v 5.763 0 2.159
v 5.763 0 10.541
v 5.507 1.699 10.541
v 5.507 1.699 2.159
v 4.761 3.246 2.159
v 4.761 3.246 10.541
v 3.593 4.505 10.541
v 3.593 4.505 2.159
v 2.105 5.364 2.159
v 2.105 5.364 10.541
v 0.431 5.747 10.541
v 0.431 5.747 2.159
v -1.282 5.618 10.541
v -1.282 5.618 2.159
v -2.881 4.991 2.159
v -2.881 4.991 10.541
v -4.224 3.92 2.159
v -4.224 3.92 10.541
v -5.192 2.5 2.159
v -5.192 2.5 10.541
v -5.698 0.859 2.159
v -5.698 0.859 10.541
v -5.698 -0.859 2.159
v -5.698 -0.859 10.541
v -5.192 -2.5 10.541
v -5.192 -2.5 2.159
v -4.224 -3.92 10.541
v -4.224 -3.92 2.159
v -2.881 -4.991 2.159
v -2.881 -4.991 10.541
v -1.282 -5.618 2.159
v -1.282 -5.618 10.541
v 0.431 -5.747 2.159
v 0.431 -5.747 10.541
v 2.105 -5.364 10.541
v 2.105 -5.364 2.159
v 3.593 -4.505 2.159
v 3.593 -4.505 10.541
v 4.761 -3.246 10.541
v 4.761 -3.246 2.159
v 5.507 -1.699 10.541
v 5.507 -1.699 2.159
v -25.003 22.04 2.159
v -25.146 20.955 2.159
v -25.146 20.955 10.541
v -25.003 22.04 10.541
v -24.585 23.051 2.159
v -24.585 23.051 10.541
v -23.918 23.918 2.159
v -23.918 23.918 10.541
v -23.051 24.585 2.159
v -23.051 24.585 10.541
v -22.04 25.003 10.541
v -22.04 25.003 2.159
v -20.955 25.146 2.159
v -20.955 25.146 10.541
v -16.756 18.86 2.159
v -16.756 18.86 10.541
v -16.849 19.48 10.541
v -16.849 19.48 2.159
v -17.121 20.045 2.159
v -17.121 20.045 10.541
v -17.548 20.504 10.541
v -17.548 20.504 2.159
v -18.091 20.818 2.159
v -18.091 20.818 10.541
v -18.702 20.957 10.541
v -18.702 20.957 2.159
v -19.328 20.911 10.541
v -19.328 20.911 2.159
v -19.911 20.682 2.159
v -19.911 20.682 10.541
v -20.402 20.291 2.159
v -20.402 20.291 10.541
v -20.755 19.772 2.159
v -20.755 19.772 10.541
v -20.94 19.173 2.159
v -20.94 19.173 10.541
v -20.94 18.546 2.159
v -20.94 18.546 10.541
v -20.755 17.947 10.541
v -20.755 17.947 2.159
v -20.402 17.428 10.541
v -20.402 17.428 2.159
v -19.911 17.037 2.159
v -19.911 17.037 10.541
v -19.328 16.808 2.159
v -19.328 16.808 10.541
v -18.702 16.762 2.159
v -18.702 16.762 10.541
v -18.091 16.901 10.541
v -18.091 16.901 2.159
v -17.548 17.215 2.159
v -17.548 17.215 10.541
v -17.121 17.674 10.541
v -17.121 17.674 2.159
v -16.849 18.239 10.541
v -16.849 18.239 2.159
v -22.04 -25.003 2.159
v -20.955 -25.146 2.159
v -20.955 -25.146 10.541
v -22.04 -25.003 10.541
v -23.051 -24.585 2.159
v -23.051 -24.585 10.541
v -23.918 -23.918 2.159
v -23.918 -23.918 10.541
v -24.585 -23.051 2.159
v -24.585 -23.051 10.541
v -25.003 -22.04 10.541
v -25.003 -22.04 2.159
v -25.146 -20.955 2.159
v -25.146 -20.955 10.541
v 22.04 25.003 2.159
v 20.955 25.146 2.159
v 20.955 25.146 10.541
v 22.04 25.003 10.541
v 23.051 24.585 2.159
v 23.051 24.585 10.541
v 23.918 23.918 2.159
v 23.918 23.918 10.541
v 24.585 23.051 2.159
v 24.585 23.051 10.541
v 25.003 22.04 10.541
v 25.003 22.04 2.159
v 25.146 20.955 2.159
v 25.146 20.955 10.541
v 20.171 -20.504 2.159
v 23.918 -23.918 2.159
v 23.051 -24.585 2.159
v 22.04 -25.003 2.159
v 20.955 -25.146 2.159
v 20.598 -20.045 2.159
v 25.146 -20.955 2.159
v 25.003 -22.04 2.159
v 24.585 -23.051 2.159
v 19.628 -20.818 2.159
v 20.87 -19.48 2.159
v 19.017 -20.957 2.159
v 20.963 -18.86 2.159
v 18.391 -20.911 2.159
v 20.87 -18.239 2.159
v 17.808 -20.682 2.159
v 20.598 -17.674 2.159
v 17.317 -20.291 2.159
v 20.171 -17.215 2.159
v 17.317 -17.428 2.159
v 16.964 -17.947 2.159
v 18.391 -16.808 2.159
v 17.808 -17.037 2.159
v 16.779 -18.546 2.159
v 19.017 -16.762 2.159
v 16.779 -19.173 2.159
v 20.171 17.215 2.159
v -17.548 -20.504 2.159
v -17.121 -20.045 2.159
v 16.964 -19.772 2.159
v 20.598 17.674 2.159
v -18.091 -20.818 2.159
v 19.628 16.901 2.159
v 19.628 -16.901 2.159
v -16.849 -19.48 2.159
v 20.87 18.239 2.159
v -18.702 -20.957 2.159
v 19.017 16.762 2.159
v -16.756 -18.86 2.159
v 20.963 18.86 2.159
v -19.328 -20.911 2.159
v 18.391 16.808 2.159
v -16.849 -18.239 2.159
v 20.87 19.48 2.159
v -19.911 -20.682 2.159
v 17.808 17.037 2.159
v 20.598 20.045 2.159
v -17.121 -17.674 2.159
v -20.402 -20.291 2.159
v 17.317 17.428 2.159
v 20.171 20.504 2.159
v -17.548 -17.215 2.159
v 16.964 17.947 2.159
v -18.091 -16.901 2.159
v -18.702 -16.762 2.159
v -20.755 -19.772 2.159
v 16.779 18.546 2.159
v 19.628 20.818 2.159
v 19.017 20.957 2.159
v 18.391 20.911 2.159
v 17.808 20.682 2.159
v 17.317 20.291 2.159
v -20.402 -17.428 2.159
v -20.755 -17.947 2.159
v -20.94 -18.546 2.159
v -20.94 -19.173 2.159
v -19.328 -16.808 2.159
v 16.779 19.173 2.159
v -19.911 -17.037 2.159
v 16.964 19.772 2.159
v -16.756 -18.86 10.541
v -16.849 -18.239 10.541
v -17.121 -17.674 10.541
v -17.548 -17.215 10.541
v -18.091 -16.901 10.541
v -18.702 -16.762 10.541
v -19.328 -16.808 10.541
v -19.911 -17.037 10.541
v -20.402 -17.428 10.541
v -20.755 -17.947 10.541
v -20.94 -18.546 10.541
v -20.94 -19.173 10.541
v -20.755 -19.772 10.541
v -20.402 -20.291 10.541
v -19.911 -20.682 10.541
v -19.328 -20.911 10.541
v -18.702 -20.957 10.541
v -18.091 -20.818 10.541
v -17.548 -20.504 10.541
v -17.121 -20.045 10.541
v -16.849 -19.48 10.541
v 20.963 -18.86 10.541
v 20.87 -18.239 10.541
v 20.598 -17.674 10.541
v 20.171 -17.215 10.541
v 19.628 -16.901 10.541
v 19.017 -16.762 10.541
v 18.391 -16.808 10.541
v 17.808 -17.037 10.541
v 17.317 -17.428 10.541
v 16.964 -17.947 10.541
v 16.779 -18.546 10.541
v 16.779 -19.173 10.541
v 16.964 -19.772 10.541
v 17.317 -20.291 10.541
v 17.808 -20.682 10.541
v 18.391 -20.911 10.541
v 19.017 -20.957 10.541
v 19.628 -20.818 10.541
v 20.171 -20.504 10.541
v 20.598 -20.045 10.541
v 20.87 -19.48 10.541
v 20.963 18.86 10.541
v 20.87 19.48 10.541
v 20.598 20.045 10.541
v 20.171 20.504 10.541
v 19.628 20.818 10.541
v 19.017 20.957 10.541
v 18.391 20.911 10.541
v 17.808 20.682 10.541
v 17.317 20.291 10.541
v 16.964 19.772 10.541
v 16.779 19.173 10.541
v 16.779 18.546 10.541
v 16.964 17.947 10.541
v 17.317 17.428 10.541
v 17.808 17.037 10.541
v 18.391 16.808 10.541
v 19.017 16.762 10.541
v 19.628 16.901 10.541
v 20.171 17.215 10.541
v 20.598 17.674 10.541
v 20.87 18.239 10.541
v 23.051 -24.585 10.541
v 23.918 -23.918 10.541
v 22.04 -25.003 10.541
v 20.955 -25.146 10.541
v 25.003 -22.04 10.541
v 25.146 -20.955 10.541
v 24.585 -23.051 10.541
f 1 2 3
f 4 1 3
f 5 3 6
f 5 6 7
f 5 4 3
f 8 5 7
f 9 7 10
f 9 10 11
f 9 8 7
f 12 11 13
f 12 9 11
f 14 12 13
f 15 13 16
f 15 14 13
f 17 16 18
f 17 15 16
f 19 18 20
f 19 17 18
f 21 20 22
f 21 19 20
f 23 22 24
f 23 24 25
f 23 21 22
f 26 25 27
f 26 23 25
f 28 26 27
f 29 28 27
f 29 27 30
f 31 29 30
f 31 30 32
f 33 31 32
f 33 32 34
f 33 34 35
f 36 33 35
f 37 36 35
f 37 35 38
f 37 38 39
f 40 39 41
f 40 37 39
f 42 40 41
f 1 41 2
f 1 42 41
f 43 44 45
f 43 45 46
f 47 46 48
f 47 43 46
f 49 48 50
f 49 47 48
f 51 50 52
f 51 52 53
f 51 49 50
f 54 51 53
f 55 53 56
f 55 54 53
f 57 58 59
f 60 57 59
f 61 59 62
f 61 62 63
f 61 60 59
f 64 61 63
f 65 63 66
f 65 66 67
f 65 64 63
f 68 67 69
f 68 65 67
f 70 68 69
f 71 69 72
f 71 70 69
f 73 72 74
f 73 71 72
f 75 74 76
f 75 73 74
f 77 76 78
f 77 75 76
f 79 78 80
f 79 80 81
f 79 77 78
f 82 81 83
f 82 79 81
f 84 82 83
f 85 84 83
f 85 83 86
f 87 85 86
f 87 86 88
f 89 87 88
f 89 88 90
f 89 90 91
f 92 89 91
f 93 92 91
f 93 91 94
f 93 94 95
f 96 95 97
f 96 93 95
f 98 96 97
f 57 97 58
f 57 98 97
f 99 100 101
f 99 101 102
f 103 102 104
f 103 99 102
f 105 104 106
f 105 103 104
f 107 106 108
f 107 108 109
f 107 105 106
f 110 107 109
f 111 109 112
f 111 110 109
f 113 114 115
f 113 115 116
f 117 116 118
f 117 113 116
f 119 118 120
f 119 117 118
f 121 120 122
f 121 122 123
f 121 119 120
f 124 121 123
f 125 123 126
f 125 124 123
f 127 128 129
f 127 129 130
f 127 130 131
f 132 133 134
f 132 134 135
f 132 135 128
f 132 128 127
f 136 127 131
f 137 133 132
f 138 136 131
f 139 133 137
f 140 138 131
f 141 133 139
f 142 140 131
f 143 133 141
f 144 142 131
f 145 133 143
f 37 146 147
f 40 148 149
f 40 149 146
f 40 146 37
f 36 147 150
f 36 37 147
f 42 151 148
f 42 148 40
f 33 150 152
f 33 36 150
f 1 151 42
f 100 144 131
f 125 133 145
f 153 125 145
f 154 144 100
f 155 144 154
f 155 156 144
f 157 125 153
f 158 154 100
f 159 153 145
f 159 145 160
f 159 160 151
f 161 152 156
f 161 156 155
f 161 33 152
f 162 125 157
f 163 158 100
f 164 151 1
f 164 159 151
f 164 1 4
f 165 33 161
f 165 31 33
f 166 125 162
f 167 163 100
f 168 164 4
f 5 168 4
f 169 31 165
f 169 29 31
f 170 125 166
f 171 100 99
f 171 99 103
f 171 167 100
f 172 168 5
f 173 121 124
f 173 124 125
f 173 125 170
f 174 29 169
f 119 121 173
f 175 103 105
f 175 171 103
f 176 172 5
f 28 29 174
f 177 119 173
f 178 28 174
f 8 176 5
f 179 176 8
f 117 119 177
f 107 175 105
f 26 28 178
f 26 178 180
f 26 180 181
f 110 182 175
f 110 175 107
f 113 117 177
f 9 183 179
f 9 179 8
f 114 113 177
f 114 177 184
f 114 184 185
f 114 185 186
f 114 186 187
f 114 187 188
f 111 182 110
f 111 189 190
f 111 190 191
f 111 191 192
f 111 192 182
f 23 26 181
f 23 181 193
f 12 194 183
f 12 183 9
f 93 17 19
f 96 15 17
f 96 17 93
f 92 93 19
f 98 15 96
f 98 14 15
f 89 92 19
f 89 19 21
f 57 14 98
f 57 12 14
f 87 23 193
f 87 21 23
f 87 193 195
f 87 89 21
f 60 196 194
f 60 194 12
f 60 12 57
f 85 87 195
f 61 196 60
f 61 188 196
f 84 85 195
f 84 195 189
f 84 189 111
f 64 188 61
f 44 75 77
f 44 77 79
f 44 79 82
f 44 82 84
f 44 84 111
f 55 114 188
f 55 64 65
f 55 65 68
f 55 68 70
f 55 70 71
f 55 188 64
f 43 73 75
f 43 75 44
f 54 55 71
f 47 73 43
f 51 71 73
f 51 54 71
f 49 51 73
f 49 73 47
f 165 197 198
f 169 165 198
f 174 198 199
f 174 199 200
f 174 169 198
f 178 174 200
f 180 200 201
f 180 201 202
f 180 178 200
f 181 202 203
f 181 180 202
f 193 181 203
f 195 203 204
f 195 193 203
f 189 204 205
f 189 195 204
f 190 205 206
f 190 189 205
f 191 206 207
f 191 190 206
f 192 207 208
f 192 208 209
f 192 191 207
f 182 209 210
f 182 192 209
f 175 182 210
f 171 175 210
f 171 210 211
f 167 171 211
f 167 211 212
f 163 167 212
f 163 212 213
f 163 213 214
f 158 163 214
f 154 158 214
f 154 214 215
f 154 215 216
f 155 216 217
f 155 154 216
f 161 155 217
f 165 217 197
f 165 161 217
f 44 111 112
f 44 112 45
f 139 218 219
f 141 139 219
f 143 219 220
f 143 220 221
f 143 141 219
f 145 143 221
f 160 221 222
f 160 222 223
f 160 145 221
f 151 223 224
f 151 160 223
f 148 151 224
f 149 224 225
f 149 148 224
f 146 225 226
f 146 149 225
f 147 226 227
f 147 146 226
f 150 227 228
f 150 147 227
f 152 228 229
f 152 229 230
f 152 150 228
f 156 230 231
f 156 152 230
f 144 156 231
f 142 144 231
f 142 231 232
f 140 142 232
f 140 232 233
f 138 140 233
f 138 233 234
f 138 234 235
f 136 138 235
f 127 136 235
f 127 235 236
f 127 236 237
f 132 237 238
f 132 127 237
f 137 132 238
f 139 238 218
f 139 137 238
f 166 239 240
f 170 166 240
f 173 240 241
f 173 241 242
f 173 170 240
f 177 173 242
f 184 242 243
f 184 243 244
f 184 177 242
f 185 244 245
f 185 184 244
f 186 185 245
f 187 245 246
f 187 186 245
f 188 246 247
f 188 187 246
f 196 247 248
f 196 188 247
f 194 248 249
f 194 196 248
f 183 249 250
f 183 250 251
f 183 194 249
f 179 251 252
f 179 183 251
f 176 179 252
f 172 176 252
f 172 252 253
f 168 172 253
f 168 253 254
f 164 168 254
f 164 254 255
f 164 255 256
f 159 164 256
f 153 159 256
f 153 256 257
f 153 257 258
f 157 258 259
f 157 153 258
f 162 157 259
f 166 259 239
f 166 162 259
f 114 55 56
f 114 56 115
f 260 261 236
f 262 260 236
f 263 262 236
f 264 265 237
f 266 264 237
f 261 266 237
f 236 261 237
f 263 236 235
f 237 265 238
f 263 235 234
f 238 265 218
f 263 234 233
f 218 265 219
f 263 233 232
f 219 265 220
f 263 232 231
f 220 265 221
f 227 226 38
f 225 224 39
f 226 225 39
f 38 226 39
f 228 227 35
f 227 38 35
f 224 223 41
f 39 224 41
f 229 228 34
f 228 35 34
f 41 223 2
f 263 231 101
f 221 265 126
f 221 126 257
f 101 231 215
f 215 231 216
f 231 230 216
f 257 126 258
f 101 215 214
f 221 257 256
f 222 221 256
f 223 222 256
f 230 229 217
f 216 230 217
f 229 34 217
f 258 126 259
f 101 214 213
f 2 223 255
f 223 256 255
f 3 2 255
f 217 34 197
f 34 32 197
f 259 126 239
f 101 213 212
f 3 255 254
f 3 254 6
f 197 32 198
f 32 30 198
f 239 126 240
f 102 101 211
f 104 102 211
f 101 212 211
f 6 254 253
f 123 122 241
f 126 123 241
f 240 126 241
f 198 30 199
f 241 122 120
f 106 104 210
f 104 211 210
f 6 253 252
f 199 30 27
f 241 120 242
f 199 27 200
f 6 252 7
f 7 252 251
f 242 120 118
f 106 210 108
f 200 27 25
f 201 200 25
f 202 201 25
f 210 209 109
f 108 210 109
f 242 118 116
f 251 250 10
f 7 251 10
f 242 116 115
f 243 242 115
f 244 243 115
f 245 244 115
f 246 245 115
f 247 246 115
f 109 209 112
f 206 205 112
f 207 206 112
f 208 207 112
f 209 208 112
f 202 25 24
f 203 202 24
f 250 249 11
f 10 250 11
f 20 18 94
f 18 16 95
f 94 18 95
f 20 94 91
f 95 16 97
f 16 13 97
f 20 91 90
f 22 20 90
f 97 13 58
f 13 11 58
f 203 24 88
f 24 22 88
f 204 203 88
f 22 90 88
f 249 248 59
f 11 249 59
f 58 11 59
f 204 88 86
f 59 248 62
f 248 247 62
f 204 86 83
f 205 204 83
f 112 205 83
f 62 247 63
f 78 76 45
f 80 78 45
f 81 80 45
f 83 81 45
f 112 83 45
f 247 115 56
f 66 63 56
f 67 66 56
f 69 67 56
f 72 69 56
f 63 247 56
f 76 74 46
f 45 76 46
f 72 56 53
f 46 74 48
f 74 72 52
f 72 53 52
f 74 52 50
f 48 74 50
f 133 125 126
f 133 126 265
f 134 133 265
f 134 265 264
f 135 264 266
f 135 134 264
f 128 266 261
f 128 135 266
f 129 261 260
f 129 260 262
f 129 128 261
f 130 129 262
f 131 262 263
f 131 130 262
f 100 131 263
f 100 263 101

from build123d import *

# Parameters (mm, degrees)
SKETCH1_R           = 8.73125
SKETCH1_R_2         = 3.1877
BOSS_EXTRUDE1_DEPTH = 12.7
SCALE1_SCALE        = 0.66


with BuildPart() as part:
    # Sketch1 → Boss-Extrude1 (new body)
    with BuildSketch(Plane.XY):
        with BuildLine():
            Line((-31.75, 38.1), (31.75, 38.1))
            ThreePointArc((31.75, 38.1), (36.240128061, 36.240128061), (38.1, 31.75))
            Line((38.1, 31.75), (38.1, -31.75))
            ThreePointArc((38.1, -31.75), (36.240128061, -36.240128061), (31.75, -38.1))
            Line((31.75, -38.1), (-31.75, -38.1))
            ThreePointArc((-31.75, -38.1), (-36.240128061, -36.240128061), (-38.1, -31.75))
            Line((-38.1, -31.75), (-38.1, 31.75))
            ThreePointArc((-38.1, 31.75), (-36.240128061, 36.240128061), (-31.75, 38.1))
        make_face()
        Circle(SKETCH1_R, mode=Mode.SUBTRACT)
        with Locations((-28.575, 28.575)):
            Circle(SKETCH1_R_2, mode=Mode.SUBTRACT)
        with Locations((28.575, 28.575)):
            Circle(SKETCH1_R_2, mode=Mode.SUBTRACT)
        with Locations((28.575, -28.575)):
            Circle(SKETCH1_R_2, mode=Mode.SUBTRACT)
        with Locations((-28.575, -28.575)):
            Circle(SKETCH1_R_2, mode=Mode.SUBTRACT)
    extrude(amount=BOSS_EXTRUDE1_DEPTH)


with BuildPart() as part_1:
    # Scale1: scaled about (0, 0, 6.35)
    add(part.part.scale(SCALE1_SCALE).moved(Location((0, 0, 2.159))))


solid = part_1.part
